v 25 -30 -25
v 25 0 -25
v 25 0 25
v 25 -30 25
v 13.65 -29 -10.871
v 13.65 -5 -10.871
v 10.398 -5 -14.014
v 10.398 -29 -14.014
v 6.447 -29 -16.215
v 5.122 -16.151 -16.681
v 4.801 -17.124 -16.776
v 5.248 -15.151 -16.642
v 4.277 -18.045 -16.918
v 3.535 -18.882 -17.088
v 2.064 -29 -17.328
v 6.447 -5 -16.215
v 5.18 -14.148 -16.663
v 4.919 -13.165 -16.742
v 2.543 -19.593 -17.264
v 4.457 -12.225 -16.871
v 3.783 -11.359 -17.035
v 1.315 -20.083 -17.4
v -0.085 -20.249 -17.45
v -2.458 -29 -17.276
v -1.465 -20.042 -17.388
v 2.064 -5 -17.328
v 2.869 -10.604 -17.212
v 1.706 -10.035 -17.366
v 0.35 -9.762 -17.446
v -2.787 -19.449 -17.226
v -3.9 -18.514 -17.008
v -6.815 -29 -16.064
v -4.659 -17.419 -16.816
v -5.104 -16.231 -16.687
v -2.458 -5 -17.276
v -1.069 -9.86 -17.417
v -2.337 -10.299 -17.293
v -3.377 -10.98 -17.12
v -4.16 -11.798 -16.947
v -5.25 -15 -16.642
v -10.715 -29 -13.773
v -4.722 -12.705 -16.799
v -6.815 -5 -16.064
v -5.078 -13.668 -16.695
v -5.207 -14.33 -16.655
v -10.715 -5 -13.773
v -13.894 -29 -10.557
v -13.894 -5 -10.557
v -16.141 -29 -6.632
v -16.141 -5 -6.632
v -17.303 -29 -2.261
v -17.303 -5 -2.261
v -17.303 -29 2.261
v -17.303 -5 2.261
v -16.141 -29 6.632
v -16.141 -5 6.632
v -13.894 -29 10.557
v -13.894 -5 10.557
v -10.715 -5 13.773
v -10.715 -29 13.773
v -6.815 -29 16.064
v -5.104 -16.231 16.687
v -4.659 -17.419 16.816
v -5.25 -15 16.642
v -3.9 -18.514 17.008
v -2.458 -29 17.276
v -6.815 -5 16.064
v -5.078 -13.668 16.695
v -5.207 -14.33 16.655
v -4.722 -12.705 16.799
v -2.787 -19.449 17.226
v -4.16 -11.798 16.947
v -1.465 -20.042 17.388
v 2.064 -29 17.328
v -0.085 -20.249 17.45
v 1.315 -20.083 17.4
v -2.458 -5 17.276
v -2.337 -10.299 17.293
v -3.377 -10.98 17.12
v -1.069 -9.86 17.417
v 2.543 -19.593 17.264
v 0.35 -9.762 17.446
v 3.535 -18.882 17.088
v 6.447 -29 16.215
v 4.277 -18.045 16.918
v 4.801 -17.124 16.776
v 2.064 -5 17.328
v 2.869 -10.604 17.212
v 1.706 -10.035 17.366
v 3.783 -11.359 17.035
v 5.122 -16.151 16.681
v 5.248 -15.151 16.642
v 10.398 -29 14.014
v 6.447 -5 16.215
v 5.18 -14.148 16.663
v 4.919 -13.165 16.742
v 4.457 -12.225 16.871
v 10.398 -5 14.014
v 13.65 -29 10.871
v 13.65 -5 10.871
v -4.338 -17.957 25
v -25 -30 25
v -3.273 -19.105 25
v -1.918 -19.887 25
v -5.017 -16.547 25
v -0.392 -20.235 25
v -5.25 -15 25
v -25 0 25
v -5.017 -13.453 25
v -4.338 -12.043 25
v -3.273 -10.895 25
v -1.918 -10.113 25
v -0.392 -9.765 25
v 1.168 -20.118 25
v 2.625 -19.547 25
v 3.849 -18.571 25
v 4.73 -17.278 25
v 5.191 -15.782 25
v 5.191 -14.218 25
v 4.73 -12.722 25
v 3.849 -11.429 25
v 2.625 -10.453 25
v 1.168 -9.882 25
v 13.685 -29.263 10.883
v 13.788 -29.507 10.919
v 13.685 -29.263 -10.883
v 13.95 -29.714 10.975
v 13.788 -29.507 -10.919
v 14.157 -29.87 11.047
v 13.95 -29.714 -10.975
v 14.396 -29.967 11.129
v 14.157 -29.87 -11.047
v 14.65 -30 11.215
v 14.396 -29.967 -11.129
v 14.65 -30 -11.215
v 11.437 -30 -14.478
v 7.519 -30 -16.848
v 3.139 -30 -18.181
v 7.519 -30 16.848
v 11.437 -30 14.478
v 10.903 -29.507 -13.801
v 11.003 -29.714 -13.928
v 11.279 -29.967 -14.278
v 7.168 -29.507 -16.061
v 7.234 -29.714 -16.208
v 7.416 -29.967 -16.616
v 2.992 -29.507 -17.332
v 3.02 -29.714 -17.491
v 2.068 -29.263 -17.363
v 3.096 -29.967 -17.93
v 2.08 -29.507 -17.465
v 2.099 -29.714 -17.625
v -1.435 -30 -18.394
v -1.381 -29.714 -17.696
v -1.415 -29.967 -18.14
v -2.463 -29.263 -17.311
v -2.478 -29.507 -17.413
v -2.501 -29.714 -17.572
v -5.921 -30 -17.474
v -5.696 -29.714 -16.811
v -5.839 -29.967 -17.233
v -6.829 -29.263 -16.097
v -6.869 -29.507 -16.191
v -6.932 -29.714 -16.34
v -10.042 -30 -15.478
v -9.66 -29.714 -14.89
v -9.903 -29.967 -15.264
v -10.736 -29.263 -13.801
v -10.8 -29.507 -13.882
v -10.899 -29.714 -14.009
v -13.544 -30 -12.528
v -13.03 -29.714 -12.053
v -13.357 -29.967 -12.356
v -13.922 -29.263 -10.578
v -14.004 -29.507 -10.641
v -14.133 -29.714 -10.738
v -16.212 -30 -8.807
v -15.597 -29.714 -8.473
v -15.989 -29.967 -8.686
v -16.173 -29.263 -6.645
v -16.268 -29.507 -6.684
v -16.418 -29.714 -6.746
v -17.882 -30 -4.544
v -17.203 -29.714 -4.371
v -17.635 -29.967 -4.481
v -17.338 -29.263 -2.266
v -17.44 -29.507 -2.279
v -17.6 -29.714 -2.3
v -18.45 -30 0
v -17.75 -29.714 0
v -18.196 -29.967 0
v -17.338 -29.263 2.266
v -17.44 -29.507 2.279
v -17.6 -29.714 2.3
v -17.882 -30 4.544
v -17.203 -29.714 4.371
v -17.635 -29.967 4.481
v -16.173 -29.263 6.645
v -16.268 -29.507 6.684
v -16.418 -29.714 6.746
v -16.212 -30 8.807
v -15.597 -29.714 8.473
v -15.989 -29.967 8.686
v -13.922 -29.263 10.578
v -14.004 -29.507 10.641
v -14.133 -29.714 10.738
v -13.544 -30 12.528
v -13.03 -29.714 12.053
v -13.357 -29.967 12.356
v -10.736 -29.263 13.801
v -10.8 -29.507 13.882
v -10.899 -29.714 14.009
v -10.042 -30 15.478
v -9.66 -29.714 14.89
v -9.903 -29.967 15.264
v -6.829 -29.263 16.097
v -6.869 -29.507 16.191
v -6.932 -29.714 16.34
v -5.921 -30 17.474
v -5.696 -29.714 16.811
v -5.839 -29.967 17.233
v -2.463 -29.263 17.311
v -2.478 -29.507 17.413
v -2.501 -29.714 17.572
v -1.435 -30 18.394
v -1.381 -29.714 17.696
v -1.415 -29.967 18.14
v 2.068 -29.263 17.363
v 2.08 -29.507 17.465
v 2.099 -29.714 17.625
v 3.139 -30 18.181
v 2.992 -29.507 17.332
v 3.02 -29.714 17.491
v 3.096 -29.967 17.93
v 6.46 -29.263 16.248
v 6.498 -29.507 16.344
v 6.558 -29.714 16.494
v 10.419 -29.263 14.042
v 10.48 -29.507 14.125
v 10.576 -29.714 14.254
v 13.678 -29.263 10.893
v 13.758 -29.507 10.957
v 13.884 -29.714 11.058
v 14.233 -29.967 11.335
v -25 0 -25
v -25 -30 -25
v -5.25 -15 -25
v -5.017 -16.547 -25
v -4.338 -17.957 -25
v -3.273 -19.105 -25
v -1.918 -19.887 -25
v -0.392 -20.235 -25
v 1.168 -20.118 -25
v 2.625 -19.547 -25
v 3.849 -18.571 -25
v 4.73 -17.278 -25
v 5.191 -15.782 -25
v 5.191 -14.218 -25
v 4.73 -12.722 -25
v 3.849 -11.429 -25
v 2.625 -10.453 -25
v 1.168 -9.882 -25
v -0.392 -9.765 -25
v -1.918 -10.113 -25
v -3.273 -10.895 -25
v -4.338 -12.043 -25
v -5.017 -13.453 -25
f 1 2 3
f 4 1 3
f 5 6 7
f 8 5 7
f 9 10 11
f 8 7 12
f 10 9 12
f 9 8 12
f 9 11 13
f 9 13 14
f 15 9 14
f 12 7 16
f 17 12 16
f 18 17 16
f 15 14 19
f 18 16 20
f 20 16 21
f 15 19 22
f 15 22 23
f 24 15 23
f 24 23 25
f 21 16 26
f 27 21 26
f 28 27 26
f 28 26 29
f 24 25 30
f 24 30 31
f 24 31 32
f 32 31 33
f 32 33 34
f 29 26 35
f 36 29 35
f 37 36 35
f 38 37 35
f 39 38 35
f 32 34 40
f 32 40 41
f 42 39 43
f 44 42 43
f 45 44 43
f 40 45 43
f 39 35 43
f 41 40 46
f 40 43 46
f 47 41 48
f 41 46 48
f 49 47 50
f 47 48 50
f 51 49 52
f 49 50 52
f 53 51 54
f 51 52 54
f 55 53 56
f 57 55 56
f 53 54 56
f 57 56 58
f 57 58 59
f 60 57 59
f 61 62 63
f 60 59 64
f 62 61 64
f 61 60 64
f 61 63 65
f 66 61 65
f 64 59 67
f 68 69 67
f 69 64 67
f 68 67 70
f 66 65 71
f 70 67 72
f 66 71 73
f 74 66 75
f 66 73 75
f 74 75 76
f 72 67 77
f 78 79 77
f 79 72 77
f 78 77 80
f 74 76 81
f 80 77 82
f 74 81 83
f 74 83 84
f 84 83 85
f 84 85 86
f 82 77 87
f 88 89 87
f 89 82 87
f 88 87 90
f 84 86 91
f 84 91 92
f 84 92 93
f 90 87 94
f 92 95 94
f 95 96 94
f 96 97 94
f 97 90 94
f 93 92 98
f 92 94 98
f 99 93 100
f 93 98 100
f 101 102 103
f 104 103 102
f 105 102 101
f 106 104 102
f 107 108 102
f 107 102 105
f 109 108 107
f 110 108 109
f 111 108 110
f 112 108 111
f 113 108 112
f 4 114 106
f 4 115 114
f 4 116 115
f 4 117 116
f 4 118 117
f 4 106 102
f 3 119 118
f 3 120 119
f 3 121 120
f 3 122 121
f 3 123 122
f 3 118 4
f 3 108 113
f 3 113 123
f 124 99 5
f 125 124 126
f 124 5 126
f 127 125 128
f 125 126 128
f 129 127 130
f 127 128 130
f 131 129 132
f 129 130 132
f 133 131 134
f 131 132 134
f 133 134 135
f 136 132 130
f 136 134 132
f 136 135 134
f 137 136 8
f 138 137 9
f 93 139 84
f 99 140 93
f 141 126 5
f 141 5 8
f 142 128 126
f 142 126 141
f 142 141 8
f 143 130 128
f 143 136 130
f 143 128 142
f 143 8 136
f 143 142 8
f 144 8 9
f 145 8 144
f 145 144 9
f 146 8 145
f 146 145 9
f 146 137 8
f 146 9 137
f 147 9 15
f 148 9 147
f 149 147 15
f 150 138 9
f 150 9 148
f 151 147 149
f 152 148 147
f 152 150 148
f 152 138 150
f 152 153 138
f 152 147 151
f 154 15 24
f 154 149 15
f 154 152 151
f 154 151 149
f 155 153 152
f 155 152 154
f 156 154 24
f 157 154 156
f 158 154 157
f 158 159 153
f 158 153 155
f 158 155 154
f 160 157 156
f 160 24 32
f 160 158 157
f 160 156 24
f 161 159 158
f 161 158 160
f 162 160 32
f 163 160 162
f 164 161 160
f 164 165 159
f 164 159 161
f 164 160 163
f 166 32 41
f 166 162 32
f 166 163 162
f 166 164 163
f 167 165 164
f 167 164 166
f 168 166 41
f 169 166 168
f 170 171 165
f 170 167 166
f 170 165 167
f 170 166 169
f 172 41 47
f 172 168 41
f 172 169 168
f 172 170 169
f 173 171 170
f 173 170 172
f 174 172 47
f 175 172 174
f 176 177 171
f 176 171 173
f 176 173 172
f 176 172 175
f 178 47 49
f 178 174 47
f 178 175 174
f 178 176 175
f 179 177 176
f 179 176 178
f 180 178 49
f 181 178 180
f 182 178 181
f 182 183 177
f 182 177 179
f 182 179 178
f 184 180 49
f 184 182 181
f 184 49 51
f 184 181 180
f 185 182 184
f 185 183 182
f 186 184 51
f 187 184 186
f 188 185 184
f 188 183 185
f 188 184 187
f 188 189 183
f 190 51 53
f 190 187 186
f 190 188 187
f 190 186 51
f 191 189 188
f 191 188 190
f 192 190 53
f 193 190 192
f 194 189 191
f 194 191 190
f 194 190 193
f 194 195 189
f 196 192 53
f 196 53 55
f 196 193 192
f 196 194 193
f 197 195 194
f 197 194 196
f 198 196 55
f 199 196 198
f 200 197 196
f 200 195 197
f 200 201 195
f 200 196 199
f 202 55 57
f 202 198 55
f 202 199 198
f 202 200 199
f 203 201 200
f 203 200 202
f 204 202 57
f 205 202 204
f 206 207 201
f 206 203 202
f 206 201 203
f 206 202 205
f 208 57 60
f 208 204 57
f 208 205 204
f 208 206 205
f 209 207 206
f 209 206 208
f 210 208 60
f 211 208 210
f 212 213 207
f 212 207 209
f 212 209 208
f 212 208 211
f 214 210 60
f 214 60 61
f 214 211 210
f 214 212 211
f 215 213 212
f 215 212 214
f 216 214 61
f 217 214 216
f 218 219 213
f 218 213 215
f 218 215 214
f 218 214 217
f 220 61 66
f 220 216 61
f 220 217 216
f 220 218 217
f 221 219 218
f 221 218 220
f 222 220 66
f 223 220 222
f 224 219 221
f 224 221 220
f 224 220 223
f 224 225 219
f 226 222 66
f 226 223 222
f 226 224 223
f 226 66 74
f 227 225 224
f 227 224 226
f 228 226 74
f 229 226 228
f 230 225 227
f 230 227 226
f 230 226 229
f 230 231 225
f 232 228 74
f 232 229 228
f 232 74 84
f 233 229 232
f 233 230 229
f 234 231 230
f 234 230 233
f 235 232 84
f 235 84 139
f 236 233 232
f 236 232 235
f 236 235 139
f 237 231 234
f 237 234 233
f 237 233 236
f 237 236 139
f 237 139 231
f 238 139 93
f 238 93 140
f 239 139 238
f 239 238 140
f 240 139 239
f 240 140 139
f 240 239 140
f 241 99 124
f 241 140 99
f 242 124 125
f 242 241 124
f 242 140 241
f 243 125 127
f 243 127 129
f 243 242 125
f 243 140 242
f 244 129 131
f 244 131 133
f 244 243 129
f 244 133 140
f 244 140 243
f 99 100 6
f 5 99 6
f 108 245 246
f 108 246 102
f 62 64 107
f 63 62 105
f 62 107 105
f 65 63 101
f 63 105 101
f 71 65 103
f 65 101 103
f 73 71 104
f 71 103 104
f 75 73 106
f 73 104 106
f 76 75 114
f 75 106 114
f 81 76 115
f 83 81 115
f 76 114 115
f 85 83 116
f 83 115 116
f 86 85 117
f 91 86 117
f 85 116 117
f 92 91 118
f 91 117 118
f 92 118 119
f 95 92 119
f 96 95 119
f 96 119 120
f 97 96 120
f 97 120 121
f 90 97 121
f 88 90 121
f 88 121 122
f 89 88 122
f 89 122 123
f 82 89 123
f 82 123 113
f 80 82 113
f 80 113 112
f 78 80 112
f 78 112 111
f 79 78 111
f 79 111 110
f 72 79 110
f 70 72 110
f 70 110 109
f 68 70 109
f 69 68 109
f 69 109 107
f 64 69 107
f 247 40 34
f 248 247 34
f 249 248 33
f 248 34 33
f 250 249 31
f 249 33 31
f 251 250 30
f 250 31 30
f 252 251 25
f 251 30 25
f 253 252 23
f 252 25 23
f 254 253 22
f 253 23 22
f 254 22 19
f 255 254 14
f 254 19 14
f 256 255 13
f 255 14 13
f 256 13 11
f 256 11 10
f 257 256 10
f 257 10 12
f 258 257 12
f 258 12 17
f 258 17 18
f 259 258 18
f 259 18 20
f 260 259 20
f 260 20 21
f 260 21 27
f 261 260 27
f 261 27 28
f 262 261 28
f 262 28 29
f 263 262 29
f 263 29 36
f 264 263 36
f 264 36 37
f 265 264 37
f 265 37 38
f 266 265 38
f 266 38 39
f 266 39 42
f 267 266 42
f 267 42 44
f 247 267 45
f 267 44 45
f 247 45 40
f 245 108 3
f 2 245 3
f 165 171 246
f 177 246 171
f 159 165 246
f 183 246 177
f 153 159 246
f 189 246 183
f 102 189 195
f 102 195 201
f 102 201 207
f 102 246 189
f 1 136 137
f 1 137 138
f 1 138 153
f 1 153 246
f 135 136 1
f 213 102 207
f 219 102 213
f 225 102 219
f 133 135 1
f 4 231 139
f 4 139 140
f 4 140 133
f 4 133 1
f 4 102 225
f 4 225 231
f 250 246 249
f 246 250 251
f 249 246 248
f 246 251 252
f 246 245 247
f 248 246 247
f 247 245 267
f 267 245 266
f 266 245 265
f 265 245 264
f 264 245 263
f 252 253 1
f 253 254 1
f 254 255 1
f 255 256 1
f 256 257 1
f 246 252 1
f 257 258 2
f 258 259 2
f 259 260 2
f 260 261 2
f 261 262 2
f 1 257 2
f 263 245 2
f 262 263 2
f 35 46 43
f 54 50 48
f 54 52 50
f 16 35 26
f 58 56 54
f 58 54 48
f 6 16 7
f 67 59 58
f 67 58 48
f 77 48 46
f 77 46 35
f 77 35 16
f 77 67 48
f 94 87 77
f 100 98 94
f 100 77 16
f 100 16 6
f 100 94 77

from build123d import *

# Parameters (mm, degrees)
F0_W     = 50
F0_H     = 50
F1_DEPTH = 30
F3_R     = 1
F4_W     = 50
F4_H     = 50
F5_DEPTH = 5
F6_D     = 10.5


with BuildPart() as f1:
    # F0 (on Front) → F1 (new body)
    with BuildSketch(Plane.XZ):
        Rectangle(F0_W, F0_H)
        with BuildLine():
            ThreePointArc((13.65, -10.8710625056), (-17.45, 0), (13.65, 10.8710625056))
            Line((13.65, 10.8710625056), (13.65, -10.8710625056))
        make_face(mode=Mode.SUBTRACT)
    extrude(amount=F1_DEPTH)

    # F3
    f3_edges = [f1.edges().sort_by_distance(p)[0] for p in [
        (13.65, -30, 0),
        (-17.45, -30, 0),
    ]]
    fillet(f3_edges, radius=F3_R)

    # F4 (on face) → F5 (join)
    with BuildSketch(Plane.XZ):
        Rectangle(F4_W, F4_H)
    extrude(amount=F5_DEPTH)

    # F6 (through all)
    with Locations(Plane(origin=(0, 0, -25), x_dir=(1, 0, 0), z_dir=(0, 0, -1))):
        with Locations((0, 15)):
            Hole(F6_D / 2)


solid = f1.part
